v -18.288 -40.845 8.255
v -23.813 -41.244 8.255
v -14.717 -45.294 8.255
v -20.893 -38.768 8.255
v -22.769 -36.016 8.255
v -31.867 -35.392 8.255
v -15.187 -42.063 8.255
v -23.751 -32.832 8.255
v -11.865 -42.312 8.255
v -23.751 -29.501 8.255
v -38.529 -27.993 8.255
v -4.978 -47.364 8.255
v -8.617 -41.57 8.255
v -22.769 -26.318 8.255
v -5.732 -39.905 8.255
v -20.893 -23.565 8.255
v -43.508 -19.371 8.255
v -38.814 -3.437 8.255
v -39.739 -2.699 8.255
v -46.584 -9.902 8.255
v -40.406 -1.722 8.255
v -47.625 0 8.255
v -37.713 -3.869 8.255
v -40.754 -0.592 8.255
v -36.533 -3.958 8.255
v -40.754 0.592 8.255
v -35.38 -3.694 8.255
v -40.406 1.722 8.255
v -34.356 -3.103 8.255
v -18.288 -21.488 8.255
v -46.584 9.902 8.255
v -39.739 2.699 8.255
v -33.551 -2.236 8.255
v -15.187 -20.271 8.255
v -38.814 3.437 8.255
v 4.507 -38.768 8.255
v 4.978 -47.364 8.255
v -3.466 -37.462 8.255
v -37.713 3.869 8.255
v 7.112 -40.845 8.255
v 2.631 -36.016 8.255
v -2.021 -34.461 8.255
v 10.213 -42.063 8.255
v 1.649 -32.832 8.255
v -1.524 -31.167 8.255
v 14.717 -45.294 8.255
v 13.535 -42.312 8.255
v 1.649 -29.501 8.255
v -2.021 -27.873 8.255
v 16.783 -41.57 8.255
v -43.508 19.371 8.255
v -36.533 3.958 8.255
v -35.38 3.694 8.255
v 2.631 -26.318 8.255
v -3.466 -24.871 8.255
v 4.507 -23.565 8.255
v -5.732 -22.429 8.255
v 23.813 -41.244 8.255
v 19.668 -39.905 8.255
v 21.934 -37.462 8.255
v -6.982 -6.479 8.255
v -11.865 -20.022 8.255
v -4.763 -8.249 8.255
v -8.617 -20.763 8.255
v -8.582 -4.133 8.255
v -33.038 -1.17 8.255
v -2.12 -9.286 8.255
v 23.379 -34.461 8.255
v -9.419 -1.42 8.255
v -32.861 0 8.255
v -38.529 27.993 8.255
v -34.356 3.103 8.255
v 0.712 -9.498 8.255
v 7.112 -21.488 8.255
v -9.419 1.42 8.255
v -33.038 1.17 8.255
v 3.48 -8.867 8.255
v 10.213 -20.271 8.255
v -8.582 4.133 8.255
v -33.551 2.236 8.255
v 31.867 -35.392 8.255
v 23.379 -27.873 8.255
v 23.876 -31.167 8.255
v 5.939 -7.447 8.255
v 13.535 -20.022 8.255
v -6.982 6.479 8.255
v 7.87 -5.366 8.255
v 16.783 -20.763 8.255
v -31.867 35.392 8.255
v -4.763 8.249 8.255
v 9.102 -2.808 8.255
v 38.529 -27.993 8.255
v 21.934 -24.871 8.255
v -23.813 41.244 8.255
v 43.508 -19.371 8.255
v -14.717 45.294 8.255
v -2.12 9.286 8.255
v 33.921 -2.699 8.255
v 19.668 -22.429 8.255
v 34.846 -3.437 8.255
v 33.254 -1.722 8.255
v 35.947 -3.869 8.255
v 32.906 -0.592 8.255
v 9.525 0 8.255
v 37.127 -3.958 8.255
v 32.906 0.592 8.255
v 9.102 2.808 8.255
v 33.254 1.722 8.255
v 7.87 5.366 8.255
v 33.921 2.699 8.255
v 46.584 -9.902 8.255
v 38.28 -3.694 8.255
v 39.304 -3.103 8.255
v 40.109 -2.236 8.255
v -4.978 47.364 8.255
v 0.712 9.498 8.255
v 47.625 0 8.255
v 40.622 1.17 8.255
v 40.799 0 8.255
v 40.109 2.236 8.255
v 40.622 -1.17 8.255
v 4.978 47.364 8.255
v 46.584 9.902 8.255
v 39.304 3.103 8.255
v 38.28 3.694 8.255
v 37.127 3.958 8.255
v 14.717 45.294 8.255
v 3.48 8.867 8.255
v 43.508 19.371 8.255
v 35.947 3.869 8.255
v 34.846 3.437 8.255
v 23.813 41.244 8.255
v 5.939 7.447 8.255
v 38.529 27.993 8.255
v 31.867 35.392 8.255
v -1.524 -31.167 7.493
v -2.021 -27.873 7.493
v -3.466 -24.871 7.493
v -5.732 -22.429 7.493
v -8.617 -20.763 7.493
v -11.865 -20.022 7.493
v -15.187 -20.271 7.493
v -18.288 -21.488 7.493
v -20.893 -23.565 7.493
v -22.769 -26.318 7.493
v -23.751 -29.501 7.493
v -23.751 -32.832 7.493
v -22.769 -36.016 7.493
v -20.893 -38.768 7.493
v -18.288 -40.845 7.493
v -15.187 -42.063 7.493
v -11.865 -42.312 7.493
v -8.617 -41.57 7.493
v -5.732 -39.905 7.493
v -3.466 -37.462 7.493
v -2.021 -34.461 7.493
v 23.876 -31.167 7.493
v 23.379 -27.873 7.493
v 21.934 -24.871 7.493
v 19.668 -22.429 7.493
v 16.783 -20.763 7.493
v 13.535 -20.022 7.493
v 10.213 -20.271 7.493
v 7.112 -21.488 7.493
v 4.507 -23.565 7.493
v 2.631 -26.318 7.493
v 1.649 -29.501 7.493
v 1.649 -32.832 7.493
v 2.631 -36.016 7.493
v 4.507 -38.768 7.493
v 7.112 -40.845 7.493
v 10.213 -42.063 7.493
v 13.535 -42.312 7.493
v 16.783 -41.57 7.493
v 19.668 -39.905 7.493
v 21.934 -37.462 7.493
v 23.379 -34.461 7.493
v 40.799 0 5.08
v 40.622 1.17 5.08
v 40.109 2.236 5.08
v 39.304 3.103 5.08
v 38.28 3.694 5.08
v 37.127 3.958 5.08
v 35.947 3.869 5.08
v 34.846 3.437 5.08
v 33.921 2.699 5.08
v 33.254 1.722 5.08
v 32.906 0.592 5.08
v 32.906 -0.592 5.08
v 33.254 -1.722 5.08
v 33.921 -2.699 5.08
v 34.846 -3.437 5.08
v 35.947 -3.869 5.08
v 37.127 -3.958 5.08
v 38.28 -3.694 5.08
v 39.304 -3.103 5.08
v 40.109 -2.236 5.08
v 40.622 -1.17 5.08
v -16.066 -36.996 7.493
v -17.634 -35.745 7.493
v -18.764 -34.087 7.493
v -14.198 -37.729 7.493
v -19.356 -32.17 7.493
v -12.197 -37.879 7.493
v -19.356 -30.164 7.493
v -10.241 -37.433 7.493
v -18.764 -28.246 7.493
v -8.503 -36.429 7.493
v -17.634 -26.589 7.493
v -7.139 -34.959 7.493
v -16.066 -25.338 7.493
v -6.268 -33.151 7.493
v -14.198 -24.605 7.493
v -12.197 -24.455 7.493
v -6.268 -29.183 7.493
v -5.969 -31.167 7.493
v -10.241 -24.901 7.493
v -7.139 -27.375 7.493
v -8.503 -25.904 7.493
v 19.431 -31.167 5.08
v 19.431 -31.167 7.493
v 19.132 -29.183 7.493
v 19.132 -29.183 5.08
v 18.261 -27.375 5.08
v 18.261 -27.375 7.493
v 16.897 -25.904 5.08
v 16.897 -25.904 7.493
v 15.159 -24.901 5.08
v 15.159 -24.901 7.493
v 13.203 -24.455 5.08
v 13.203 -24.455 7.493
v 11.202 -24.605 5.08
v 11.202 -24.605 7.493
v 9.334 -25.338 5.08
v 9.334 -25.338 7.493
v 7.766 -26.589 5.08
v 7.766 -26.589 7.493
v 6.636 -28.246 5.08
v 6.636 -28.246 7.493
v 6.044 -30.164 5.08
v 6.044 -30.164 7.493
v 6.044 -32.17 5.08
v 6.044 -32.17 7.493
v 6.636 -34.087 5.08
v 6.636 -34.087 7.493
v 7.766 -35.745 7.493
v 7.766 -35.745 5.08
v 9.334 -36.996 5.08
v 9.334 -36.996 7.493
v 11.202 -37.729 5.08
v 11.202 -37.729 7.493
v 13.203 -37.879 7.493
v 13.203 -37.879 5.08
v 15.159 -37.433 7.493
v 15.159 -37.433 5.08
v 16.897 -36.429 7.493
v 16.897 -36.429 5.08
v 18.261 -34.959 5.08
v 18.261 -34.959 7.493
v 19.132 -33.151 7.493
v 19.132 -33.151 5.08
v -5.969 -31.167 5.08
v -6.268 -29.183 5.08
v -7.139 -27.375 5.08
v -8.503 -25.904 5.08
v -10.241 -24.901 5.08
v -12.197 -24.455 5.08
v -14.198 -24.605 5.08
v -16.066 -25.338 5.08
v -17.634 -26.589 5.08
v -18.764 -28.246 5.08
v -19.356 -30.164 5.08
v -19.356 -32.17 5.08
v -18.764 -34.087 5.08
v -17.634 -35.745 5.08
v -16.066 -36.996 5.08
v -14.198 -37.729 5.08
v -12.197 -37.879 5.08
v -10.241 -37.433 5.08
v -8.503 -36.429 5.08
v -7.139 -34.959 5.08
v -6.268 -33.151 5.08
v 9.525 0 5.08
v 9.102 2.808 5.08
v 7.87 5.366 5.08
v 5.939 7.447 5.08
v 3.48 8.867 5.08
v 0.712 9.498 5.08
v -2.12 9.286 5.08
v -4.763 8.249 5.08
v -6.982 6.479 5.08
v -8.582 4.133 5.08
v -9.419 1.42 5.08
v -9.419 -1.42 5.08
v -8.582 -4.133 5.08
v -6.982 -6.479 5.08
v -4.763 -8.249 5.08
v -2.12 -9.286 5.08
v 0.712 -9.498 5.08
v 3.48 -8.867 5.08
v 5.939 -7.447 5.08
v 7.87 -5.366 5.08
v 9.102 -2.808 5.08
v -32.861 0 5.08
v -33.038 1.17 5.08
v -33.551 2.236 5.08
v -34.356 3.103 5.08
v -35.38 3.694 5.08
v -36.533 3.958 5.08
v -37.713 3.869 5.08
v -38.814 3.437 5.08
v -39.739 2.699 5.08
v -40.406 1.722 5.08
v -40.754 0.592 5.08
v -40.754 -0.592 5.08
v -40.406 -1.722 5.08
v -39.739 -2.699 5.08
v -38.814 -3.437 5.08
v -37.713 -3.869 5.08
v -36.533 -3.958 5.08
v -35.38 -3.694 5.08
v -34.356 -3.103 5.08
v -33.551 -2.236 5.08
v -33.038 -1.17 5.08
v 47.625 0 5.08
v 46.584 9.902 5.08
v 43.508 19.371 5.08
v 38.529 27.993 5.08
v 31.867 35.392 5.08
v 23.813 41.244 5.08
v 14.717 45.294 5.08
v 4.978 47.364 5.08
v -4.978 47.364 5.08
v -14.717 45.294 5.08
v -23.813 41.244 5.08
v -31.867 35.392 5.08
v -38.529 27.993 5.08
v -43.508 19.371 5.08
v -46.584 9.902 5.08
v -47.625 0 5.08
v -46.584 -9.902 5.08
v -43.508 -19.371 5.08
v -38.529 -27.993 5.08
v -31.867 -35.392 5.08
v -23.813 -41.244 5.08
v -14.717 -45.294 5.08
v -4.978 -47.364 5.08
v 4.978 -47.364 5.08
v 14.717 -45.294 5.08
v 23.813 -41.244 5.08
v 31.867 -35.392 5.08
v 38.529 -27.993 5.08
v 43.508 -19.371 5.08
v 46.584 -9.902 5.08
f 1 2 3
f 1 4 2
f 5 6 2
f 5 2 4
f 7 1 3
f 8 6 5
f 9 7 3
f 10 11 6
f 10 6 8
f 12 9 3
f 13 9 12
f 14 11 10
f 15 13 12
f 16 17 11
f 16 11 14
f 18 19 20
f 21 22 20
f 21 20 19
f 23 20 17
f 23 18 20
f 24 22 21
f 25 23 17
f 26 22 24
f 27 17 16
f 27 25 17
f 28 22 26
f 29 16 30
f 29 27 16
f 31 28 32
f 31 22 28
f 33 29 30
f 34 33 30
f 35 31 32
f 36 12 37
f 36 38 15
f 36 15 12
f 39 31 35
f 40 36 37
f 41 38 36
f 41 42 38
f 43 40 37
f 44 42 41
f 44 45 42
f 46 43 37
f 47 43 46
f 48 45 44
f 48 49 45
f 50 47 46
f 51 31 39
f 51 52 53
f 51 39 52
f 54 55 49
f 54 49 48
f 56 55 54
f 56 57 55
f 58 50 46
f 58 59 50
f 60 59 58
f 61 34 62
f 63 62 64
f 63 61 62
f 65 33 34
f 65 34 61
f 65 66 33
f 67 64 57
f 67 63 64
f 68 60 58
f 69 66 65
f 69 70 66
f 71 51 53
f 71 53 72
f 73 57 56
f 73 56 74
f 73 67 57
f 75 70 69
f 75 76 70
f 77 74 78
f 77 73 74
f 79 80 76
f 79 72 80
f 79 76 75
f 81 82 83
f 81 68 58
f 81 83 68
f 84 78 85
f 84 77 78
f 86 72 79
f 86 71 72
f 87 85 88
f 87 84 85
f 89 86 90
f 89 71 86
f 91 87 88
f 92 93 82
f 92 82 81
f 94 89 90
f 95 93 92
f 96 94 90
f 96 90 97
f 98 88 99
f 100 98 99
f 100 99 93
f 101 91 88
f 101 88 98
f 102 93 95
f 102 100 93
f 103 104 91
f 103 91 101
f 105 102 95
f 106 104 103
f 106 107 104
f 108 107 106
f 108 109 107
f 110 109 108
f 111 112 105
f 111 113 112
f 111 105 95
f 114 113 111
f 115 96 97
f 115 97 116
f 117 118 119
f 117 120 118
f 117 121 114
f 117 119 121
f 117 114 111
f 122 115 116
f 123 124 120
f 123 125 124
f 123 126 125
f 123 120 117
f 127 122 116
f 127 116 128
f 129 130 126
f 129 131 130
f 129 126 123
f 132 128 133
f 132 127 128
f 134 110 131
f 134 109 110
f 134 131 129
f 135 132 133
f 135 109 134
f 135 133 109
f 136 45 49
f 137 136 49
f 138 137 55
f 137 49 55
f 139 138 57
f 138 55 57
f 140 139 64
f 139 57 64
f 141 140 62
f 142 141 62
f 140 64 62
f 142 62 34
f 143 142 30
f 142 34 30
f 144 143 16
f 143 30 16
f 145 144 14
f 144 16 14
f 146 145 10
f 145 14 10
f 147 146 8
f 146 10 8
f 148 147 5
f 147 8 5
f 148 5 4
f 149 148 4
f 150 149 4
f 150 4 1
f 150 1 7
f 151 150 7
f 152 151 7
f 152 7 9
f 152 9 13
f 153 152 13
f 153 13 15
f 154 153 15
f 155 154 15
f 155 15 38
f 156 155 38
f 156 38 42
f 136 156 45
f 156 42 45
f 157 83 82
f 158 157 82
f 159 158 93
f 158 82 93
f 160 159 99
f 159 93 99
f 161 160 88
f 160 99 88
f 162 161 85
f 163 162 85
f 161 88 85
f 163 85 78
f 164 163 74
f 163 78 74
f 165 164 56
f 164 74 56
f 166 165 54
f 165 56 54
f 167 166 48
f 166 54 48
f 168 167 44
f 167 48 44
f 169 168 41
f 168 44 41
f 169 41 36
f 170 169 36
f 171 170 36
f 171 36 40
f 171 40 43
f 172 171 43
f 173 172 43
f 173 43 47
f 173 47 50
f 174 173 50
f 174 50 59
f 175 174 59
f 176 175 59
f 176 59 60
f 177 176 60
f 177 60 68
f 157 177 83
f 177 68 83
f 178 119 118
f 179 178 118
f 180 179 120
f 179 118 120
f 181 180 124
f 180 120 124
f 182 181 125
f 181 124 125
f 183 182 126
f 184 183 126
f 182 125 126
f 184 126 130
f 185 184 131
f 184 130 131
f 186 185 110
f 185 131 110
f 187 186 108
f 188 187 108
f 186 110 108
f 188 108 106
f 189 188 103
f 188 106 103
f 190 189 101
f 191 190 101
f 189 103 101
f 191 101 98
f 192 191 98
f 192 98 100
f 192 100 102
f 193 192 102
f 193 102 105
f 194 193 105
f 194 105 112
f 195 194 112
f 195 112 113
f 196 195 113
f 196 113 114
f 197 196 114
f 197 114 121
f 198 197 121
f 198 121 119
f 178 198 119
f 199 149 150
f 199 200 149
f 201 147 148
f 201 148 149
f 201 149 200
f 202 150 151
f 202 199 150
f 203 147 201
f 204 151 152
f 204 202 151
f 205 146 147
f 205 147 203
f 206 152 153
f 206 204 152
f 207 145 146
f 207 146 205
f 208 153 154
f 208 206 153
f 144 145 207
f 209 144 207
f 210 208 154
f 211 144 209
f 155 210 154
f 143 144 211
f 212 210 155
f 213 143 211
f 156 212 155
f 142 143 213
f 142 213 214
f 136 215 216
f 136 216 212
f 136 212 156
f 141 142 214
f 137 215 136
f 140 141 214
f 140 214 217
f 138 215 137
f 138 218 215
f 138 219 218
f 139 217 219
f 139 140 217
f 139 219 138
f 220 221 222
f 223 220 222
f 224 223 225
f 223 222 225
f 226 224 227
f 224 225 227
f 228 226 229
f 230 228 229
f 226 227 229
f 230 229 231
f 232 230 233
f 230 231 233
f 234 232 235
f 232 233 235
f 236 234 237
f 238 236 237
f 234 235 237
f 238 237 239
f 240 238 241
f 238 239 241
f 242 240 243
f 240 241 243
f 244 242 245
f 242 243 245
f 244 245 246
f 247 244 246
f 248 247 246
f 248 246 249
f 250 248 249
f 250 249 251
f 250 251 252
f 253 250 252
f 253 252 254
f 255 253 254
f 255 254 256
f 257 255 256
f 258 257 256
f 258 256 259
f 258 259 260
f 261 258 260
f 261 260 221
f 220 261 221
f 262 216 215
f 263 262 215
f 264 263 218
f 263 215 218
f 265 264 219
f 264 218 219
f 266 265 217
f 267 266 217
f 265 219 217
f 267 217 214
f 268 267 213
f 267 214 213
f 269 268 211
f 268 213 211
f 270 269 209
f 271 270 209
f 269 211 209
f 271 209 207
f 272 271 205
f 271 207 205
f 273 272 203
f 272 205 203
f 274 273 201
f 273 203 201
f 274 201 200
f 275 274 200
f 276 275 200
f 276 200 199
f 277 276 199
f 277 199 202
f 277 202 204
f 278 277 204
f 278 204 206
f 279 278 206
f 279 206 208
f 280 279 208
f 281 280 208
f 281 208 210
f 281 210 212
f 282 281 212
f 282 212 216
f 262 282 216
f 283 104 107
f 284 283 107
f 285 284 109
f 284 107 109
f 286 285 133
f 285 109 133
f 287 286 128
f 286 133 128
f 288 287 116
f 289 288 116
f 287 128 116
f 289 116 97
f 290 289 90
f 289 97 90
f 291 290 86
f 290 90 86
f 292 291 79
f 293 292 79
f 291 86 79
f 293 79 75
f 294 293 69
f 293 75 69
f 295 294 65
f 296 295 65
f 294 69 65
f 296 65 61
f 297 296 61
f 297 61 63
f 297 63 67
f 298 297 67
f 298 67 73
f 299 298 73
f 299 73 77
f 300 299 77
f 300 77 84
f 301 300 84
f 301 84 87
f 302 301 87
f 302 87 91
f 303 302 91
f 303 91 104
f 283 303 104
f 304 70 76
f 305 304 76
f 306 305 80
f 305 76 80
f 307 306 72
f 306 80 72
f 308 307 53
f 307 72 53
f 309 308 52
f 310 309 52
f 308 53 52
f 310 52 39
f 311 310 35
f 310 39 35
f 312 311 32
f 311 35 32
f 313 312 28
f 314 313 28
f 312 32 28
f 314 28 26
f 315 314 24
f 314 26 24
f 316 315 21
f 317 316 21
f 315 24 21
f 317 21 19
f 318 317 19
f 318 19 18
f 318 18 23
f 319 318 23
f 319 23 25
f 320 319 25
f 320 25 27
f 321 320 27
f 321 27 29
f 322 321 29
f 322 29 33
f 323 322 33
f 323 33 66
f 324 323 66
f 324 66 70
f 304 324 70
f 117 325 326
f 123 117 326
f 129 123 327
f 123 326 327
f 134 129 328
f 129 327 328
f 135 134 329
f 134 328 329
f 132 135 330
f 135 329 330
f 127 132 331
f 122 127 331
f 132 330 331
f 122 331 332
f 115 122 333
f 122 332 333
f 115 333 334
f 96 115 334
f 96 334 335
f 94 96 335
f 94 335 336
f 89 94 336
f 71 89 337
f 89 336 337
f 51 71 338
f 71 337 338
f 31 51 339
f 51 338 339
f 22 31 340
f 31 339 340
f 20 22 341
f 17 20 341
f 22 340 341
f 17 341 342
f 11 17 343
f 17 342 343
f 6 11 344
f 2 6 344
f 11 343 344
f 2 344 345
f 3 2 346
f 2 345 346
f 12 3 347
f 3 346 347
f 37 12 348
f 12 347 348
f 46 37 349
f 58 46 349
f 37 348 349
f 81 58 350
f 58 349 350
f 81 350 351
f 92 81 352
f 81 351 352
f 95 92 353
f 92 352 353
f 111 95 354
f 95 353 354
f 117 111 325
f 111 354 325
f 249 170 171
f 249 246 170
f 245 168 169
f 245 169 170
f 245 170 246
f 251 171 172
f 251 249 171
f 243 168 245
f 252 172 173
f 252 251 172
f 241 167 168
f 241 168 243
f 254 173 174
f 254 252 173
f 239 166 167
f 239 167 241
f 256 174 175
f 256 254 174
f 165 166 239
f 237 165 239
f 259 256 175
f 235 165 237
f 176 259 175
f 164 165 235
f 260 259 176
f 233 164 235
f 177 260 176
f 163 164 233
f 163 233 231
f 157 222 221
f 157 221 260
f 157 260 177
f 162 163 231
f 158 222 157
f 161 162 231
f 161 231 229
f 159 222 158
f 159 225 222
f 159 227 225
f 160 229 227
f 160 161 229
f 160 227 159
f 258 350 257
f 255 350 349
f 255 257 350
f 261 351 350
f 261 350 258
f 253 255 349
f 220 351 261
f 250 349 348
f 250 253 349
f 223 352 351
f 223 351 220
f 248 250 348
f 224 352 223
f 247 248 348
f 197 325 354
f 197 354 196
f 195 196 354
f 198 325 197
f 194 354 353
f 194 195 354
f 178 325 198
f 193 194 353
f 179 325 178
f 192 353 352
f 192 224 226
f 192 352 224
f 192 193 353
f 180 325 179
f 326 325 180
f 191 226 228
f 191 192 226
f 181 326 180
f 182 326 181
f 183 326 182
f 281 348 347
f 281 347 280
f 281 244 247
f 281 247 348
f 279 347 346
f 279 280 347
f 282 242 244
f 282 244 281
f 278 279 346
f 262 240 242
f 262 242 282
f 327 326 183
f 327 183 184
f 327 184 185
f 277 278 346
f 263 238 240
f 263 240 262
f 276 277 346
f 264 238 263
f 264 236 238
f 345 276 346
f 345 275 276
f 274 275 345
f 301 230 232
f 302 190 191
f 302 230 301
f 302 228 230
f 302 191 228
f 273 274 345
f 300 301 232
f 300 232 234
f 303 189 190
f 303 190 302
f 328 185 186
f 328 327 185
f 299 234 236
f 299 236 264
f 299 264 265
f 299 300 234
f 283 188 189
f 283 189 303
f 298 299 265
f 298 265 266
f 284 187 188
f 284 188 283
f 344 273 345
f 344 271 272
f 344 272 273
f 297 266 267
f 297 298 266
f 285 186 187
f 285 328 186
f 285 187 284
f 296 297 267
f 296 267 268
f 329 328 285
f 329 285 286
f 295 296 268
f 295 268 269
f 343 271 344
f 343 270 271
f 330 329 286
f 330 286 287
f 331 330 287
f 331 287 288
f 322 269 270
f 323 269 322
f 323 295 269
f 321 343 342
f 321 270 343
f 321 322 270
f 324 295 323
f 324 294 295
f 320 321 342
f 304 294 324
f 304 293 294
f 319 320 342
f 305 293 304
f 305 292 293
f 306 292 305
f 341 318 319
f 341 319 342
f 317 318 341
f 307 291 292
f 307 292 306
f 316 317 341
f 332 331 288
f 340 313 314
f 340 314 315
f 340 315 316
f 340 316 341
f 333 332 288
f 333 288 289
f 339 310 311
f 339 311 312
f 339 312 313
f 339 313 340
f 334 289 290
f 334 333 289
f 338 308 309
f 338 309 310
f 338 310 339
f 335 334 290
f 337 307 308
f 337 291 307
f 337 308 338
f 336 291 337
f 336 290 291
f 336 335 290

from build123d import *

# Parameters (mm, degrees)
SKETCH1_R           = 49.5046
BOSS_EXTRUDE1_DEPTH = 5.08
SKETCH2_R           = 47.625
BOSS_EXTRUDE2_DEPTH = 3.175
SKETCH3_R           = 6.731
SKETCH3_R_2         = 3.96875
SKETCH3_R_3         = 9.525
CUT_EXTRUDE1_DEPTH  = 9.255
SKETCH7_R           = 65.421404769
CUT_EXTRUDE3_DEPTH  = 5.08
SKETCH9_R           = 11.176
CUT_EXTRUDE5_DEPTH  = 0.762


with BuildPart() as part:
    # Sketch1 → Boss-Extrude1 (new body)
    with BuildSketch(Plane.XY):
        Circle(SKETCH1_R)
    extrude(amount=BOSS_EXTRUDE1_DEPTH)

    # Sketch2 → Boss-Extrude2 (add)
    with BuildSketch(Plane.XY.offset(5.08)):
        Circle(SKETCH2_R)
    extrude(amount=BOSS_EXTRUDE2_DEPTH)

    # Sketch3 → Cut-Extrude1 (cut, through all)
    with BuildSketch(Plane.XY.offset(8.255)):
        with Locations((-12.7, -31.166793627)):
            Circle(SKETCH3_R)
        with Locations((12.7, -31.166793627)):
            Circle(SKETCH3_R)
        with Locations((-36.83, 0)):
            Circle(SKETCH3_R_2)
        with Locations((36.83, 0)):
            Circle(SKETCH3_R_2)
        Circle(SKETCH3_R_3)
    extrude(amount=-CUT_EXTRUDE1_DEPTH, mode=Mode.SUBTRACT)

    # Sketch7 → Cut-Extrude3 (cut)
    with BuildSketch(Plane(origin=(0, 0, 0), x_dir=(-1, 0, 0), z_dir=(0, 0, -1))):
        Circle(SKETCH7_R)
    extrude(amount=-CUT_EXTRUDE3_DEPTH, mode=Mode.SUBTRACT)

    # Sketch9 → Cut-Extrude5 (cut)
    with BuildSketch(Plane.XY.offset(8.255)):
        with Locations((-12.7, -31.166793627)):
            Circle(SKETCH9_R)
        with Locations((12.7, -31.166793627)):
            Circle(SKETCH9_R)
    extrude(amount=-CUT_EXTRUDE5_DEPTH, mode=Mode.SUBTRACT)


solid = part.part
